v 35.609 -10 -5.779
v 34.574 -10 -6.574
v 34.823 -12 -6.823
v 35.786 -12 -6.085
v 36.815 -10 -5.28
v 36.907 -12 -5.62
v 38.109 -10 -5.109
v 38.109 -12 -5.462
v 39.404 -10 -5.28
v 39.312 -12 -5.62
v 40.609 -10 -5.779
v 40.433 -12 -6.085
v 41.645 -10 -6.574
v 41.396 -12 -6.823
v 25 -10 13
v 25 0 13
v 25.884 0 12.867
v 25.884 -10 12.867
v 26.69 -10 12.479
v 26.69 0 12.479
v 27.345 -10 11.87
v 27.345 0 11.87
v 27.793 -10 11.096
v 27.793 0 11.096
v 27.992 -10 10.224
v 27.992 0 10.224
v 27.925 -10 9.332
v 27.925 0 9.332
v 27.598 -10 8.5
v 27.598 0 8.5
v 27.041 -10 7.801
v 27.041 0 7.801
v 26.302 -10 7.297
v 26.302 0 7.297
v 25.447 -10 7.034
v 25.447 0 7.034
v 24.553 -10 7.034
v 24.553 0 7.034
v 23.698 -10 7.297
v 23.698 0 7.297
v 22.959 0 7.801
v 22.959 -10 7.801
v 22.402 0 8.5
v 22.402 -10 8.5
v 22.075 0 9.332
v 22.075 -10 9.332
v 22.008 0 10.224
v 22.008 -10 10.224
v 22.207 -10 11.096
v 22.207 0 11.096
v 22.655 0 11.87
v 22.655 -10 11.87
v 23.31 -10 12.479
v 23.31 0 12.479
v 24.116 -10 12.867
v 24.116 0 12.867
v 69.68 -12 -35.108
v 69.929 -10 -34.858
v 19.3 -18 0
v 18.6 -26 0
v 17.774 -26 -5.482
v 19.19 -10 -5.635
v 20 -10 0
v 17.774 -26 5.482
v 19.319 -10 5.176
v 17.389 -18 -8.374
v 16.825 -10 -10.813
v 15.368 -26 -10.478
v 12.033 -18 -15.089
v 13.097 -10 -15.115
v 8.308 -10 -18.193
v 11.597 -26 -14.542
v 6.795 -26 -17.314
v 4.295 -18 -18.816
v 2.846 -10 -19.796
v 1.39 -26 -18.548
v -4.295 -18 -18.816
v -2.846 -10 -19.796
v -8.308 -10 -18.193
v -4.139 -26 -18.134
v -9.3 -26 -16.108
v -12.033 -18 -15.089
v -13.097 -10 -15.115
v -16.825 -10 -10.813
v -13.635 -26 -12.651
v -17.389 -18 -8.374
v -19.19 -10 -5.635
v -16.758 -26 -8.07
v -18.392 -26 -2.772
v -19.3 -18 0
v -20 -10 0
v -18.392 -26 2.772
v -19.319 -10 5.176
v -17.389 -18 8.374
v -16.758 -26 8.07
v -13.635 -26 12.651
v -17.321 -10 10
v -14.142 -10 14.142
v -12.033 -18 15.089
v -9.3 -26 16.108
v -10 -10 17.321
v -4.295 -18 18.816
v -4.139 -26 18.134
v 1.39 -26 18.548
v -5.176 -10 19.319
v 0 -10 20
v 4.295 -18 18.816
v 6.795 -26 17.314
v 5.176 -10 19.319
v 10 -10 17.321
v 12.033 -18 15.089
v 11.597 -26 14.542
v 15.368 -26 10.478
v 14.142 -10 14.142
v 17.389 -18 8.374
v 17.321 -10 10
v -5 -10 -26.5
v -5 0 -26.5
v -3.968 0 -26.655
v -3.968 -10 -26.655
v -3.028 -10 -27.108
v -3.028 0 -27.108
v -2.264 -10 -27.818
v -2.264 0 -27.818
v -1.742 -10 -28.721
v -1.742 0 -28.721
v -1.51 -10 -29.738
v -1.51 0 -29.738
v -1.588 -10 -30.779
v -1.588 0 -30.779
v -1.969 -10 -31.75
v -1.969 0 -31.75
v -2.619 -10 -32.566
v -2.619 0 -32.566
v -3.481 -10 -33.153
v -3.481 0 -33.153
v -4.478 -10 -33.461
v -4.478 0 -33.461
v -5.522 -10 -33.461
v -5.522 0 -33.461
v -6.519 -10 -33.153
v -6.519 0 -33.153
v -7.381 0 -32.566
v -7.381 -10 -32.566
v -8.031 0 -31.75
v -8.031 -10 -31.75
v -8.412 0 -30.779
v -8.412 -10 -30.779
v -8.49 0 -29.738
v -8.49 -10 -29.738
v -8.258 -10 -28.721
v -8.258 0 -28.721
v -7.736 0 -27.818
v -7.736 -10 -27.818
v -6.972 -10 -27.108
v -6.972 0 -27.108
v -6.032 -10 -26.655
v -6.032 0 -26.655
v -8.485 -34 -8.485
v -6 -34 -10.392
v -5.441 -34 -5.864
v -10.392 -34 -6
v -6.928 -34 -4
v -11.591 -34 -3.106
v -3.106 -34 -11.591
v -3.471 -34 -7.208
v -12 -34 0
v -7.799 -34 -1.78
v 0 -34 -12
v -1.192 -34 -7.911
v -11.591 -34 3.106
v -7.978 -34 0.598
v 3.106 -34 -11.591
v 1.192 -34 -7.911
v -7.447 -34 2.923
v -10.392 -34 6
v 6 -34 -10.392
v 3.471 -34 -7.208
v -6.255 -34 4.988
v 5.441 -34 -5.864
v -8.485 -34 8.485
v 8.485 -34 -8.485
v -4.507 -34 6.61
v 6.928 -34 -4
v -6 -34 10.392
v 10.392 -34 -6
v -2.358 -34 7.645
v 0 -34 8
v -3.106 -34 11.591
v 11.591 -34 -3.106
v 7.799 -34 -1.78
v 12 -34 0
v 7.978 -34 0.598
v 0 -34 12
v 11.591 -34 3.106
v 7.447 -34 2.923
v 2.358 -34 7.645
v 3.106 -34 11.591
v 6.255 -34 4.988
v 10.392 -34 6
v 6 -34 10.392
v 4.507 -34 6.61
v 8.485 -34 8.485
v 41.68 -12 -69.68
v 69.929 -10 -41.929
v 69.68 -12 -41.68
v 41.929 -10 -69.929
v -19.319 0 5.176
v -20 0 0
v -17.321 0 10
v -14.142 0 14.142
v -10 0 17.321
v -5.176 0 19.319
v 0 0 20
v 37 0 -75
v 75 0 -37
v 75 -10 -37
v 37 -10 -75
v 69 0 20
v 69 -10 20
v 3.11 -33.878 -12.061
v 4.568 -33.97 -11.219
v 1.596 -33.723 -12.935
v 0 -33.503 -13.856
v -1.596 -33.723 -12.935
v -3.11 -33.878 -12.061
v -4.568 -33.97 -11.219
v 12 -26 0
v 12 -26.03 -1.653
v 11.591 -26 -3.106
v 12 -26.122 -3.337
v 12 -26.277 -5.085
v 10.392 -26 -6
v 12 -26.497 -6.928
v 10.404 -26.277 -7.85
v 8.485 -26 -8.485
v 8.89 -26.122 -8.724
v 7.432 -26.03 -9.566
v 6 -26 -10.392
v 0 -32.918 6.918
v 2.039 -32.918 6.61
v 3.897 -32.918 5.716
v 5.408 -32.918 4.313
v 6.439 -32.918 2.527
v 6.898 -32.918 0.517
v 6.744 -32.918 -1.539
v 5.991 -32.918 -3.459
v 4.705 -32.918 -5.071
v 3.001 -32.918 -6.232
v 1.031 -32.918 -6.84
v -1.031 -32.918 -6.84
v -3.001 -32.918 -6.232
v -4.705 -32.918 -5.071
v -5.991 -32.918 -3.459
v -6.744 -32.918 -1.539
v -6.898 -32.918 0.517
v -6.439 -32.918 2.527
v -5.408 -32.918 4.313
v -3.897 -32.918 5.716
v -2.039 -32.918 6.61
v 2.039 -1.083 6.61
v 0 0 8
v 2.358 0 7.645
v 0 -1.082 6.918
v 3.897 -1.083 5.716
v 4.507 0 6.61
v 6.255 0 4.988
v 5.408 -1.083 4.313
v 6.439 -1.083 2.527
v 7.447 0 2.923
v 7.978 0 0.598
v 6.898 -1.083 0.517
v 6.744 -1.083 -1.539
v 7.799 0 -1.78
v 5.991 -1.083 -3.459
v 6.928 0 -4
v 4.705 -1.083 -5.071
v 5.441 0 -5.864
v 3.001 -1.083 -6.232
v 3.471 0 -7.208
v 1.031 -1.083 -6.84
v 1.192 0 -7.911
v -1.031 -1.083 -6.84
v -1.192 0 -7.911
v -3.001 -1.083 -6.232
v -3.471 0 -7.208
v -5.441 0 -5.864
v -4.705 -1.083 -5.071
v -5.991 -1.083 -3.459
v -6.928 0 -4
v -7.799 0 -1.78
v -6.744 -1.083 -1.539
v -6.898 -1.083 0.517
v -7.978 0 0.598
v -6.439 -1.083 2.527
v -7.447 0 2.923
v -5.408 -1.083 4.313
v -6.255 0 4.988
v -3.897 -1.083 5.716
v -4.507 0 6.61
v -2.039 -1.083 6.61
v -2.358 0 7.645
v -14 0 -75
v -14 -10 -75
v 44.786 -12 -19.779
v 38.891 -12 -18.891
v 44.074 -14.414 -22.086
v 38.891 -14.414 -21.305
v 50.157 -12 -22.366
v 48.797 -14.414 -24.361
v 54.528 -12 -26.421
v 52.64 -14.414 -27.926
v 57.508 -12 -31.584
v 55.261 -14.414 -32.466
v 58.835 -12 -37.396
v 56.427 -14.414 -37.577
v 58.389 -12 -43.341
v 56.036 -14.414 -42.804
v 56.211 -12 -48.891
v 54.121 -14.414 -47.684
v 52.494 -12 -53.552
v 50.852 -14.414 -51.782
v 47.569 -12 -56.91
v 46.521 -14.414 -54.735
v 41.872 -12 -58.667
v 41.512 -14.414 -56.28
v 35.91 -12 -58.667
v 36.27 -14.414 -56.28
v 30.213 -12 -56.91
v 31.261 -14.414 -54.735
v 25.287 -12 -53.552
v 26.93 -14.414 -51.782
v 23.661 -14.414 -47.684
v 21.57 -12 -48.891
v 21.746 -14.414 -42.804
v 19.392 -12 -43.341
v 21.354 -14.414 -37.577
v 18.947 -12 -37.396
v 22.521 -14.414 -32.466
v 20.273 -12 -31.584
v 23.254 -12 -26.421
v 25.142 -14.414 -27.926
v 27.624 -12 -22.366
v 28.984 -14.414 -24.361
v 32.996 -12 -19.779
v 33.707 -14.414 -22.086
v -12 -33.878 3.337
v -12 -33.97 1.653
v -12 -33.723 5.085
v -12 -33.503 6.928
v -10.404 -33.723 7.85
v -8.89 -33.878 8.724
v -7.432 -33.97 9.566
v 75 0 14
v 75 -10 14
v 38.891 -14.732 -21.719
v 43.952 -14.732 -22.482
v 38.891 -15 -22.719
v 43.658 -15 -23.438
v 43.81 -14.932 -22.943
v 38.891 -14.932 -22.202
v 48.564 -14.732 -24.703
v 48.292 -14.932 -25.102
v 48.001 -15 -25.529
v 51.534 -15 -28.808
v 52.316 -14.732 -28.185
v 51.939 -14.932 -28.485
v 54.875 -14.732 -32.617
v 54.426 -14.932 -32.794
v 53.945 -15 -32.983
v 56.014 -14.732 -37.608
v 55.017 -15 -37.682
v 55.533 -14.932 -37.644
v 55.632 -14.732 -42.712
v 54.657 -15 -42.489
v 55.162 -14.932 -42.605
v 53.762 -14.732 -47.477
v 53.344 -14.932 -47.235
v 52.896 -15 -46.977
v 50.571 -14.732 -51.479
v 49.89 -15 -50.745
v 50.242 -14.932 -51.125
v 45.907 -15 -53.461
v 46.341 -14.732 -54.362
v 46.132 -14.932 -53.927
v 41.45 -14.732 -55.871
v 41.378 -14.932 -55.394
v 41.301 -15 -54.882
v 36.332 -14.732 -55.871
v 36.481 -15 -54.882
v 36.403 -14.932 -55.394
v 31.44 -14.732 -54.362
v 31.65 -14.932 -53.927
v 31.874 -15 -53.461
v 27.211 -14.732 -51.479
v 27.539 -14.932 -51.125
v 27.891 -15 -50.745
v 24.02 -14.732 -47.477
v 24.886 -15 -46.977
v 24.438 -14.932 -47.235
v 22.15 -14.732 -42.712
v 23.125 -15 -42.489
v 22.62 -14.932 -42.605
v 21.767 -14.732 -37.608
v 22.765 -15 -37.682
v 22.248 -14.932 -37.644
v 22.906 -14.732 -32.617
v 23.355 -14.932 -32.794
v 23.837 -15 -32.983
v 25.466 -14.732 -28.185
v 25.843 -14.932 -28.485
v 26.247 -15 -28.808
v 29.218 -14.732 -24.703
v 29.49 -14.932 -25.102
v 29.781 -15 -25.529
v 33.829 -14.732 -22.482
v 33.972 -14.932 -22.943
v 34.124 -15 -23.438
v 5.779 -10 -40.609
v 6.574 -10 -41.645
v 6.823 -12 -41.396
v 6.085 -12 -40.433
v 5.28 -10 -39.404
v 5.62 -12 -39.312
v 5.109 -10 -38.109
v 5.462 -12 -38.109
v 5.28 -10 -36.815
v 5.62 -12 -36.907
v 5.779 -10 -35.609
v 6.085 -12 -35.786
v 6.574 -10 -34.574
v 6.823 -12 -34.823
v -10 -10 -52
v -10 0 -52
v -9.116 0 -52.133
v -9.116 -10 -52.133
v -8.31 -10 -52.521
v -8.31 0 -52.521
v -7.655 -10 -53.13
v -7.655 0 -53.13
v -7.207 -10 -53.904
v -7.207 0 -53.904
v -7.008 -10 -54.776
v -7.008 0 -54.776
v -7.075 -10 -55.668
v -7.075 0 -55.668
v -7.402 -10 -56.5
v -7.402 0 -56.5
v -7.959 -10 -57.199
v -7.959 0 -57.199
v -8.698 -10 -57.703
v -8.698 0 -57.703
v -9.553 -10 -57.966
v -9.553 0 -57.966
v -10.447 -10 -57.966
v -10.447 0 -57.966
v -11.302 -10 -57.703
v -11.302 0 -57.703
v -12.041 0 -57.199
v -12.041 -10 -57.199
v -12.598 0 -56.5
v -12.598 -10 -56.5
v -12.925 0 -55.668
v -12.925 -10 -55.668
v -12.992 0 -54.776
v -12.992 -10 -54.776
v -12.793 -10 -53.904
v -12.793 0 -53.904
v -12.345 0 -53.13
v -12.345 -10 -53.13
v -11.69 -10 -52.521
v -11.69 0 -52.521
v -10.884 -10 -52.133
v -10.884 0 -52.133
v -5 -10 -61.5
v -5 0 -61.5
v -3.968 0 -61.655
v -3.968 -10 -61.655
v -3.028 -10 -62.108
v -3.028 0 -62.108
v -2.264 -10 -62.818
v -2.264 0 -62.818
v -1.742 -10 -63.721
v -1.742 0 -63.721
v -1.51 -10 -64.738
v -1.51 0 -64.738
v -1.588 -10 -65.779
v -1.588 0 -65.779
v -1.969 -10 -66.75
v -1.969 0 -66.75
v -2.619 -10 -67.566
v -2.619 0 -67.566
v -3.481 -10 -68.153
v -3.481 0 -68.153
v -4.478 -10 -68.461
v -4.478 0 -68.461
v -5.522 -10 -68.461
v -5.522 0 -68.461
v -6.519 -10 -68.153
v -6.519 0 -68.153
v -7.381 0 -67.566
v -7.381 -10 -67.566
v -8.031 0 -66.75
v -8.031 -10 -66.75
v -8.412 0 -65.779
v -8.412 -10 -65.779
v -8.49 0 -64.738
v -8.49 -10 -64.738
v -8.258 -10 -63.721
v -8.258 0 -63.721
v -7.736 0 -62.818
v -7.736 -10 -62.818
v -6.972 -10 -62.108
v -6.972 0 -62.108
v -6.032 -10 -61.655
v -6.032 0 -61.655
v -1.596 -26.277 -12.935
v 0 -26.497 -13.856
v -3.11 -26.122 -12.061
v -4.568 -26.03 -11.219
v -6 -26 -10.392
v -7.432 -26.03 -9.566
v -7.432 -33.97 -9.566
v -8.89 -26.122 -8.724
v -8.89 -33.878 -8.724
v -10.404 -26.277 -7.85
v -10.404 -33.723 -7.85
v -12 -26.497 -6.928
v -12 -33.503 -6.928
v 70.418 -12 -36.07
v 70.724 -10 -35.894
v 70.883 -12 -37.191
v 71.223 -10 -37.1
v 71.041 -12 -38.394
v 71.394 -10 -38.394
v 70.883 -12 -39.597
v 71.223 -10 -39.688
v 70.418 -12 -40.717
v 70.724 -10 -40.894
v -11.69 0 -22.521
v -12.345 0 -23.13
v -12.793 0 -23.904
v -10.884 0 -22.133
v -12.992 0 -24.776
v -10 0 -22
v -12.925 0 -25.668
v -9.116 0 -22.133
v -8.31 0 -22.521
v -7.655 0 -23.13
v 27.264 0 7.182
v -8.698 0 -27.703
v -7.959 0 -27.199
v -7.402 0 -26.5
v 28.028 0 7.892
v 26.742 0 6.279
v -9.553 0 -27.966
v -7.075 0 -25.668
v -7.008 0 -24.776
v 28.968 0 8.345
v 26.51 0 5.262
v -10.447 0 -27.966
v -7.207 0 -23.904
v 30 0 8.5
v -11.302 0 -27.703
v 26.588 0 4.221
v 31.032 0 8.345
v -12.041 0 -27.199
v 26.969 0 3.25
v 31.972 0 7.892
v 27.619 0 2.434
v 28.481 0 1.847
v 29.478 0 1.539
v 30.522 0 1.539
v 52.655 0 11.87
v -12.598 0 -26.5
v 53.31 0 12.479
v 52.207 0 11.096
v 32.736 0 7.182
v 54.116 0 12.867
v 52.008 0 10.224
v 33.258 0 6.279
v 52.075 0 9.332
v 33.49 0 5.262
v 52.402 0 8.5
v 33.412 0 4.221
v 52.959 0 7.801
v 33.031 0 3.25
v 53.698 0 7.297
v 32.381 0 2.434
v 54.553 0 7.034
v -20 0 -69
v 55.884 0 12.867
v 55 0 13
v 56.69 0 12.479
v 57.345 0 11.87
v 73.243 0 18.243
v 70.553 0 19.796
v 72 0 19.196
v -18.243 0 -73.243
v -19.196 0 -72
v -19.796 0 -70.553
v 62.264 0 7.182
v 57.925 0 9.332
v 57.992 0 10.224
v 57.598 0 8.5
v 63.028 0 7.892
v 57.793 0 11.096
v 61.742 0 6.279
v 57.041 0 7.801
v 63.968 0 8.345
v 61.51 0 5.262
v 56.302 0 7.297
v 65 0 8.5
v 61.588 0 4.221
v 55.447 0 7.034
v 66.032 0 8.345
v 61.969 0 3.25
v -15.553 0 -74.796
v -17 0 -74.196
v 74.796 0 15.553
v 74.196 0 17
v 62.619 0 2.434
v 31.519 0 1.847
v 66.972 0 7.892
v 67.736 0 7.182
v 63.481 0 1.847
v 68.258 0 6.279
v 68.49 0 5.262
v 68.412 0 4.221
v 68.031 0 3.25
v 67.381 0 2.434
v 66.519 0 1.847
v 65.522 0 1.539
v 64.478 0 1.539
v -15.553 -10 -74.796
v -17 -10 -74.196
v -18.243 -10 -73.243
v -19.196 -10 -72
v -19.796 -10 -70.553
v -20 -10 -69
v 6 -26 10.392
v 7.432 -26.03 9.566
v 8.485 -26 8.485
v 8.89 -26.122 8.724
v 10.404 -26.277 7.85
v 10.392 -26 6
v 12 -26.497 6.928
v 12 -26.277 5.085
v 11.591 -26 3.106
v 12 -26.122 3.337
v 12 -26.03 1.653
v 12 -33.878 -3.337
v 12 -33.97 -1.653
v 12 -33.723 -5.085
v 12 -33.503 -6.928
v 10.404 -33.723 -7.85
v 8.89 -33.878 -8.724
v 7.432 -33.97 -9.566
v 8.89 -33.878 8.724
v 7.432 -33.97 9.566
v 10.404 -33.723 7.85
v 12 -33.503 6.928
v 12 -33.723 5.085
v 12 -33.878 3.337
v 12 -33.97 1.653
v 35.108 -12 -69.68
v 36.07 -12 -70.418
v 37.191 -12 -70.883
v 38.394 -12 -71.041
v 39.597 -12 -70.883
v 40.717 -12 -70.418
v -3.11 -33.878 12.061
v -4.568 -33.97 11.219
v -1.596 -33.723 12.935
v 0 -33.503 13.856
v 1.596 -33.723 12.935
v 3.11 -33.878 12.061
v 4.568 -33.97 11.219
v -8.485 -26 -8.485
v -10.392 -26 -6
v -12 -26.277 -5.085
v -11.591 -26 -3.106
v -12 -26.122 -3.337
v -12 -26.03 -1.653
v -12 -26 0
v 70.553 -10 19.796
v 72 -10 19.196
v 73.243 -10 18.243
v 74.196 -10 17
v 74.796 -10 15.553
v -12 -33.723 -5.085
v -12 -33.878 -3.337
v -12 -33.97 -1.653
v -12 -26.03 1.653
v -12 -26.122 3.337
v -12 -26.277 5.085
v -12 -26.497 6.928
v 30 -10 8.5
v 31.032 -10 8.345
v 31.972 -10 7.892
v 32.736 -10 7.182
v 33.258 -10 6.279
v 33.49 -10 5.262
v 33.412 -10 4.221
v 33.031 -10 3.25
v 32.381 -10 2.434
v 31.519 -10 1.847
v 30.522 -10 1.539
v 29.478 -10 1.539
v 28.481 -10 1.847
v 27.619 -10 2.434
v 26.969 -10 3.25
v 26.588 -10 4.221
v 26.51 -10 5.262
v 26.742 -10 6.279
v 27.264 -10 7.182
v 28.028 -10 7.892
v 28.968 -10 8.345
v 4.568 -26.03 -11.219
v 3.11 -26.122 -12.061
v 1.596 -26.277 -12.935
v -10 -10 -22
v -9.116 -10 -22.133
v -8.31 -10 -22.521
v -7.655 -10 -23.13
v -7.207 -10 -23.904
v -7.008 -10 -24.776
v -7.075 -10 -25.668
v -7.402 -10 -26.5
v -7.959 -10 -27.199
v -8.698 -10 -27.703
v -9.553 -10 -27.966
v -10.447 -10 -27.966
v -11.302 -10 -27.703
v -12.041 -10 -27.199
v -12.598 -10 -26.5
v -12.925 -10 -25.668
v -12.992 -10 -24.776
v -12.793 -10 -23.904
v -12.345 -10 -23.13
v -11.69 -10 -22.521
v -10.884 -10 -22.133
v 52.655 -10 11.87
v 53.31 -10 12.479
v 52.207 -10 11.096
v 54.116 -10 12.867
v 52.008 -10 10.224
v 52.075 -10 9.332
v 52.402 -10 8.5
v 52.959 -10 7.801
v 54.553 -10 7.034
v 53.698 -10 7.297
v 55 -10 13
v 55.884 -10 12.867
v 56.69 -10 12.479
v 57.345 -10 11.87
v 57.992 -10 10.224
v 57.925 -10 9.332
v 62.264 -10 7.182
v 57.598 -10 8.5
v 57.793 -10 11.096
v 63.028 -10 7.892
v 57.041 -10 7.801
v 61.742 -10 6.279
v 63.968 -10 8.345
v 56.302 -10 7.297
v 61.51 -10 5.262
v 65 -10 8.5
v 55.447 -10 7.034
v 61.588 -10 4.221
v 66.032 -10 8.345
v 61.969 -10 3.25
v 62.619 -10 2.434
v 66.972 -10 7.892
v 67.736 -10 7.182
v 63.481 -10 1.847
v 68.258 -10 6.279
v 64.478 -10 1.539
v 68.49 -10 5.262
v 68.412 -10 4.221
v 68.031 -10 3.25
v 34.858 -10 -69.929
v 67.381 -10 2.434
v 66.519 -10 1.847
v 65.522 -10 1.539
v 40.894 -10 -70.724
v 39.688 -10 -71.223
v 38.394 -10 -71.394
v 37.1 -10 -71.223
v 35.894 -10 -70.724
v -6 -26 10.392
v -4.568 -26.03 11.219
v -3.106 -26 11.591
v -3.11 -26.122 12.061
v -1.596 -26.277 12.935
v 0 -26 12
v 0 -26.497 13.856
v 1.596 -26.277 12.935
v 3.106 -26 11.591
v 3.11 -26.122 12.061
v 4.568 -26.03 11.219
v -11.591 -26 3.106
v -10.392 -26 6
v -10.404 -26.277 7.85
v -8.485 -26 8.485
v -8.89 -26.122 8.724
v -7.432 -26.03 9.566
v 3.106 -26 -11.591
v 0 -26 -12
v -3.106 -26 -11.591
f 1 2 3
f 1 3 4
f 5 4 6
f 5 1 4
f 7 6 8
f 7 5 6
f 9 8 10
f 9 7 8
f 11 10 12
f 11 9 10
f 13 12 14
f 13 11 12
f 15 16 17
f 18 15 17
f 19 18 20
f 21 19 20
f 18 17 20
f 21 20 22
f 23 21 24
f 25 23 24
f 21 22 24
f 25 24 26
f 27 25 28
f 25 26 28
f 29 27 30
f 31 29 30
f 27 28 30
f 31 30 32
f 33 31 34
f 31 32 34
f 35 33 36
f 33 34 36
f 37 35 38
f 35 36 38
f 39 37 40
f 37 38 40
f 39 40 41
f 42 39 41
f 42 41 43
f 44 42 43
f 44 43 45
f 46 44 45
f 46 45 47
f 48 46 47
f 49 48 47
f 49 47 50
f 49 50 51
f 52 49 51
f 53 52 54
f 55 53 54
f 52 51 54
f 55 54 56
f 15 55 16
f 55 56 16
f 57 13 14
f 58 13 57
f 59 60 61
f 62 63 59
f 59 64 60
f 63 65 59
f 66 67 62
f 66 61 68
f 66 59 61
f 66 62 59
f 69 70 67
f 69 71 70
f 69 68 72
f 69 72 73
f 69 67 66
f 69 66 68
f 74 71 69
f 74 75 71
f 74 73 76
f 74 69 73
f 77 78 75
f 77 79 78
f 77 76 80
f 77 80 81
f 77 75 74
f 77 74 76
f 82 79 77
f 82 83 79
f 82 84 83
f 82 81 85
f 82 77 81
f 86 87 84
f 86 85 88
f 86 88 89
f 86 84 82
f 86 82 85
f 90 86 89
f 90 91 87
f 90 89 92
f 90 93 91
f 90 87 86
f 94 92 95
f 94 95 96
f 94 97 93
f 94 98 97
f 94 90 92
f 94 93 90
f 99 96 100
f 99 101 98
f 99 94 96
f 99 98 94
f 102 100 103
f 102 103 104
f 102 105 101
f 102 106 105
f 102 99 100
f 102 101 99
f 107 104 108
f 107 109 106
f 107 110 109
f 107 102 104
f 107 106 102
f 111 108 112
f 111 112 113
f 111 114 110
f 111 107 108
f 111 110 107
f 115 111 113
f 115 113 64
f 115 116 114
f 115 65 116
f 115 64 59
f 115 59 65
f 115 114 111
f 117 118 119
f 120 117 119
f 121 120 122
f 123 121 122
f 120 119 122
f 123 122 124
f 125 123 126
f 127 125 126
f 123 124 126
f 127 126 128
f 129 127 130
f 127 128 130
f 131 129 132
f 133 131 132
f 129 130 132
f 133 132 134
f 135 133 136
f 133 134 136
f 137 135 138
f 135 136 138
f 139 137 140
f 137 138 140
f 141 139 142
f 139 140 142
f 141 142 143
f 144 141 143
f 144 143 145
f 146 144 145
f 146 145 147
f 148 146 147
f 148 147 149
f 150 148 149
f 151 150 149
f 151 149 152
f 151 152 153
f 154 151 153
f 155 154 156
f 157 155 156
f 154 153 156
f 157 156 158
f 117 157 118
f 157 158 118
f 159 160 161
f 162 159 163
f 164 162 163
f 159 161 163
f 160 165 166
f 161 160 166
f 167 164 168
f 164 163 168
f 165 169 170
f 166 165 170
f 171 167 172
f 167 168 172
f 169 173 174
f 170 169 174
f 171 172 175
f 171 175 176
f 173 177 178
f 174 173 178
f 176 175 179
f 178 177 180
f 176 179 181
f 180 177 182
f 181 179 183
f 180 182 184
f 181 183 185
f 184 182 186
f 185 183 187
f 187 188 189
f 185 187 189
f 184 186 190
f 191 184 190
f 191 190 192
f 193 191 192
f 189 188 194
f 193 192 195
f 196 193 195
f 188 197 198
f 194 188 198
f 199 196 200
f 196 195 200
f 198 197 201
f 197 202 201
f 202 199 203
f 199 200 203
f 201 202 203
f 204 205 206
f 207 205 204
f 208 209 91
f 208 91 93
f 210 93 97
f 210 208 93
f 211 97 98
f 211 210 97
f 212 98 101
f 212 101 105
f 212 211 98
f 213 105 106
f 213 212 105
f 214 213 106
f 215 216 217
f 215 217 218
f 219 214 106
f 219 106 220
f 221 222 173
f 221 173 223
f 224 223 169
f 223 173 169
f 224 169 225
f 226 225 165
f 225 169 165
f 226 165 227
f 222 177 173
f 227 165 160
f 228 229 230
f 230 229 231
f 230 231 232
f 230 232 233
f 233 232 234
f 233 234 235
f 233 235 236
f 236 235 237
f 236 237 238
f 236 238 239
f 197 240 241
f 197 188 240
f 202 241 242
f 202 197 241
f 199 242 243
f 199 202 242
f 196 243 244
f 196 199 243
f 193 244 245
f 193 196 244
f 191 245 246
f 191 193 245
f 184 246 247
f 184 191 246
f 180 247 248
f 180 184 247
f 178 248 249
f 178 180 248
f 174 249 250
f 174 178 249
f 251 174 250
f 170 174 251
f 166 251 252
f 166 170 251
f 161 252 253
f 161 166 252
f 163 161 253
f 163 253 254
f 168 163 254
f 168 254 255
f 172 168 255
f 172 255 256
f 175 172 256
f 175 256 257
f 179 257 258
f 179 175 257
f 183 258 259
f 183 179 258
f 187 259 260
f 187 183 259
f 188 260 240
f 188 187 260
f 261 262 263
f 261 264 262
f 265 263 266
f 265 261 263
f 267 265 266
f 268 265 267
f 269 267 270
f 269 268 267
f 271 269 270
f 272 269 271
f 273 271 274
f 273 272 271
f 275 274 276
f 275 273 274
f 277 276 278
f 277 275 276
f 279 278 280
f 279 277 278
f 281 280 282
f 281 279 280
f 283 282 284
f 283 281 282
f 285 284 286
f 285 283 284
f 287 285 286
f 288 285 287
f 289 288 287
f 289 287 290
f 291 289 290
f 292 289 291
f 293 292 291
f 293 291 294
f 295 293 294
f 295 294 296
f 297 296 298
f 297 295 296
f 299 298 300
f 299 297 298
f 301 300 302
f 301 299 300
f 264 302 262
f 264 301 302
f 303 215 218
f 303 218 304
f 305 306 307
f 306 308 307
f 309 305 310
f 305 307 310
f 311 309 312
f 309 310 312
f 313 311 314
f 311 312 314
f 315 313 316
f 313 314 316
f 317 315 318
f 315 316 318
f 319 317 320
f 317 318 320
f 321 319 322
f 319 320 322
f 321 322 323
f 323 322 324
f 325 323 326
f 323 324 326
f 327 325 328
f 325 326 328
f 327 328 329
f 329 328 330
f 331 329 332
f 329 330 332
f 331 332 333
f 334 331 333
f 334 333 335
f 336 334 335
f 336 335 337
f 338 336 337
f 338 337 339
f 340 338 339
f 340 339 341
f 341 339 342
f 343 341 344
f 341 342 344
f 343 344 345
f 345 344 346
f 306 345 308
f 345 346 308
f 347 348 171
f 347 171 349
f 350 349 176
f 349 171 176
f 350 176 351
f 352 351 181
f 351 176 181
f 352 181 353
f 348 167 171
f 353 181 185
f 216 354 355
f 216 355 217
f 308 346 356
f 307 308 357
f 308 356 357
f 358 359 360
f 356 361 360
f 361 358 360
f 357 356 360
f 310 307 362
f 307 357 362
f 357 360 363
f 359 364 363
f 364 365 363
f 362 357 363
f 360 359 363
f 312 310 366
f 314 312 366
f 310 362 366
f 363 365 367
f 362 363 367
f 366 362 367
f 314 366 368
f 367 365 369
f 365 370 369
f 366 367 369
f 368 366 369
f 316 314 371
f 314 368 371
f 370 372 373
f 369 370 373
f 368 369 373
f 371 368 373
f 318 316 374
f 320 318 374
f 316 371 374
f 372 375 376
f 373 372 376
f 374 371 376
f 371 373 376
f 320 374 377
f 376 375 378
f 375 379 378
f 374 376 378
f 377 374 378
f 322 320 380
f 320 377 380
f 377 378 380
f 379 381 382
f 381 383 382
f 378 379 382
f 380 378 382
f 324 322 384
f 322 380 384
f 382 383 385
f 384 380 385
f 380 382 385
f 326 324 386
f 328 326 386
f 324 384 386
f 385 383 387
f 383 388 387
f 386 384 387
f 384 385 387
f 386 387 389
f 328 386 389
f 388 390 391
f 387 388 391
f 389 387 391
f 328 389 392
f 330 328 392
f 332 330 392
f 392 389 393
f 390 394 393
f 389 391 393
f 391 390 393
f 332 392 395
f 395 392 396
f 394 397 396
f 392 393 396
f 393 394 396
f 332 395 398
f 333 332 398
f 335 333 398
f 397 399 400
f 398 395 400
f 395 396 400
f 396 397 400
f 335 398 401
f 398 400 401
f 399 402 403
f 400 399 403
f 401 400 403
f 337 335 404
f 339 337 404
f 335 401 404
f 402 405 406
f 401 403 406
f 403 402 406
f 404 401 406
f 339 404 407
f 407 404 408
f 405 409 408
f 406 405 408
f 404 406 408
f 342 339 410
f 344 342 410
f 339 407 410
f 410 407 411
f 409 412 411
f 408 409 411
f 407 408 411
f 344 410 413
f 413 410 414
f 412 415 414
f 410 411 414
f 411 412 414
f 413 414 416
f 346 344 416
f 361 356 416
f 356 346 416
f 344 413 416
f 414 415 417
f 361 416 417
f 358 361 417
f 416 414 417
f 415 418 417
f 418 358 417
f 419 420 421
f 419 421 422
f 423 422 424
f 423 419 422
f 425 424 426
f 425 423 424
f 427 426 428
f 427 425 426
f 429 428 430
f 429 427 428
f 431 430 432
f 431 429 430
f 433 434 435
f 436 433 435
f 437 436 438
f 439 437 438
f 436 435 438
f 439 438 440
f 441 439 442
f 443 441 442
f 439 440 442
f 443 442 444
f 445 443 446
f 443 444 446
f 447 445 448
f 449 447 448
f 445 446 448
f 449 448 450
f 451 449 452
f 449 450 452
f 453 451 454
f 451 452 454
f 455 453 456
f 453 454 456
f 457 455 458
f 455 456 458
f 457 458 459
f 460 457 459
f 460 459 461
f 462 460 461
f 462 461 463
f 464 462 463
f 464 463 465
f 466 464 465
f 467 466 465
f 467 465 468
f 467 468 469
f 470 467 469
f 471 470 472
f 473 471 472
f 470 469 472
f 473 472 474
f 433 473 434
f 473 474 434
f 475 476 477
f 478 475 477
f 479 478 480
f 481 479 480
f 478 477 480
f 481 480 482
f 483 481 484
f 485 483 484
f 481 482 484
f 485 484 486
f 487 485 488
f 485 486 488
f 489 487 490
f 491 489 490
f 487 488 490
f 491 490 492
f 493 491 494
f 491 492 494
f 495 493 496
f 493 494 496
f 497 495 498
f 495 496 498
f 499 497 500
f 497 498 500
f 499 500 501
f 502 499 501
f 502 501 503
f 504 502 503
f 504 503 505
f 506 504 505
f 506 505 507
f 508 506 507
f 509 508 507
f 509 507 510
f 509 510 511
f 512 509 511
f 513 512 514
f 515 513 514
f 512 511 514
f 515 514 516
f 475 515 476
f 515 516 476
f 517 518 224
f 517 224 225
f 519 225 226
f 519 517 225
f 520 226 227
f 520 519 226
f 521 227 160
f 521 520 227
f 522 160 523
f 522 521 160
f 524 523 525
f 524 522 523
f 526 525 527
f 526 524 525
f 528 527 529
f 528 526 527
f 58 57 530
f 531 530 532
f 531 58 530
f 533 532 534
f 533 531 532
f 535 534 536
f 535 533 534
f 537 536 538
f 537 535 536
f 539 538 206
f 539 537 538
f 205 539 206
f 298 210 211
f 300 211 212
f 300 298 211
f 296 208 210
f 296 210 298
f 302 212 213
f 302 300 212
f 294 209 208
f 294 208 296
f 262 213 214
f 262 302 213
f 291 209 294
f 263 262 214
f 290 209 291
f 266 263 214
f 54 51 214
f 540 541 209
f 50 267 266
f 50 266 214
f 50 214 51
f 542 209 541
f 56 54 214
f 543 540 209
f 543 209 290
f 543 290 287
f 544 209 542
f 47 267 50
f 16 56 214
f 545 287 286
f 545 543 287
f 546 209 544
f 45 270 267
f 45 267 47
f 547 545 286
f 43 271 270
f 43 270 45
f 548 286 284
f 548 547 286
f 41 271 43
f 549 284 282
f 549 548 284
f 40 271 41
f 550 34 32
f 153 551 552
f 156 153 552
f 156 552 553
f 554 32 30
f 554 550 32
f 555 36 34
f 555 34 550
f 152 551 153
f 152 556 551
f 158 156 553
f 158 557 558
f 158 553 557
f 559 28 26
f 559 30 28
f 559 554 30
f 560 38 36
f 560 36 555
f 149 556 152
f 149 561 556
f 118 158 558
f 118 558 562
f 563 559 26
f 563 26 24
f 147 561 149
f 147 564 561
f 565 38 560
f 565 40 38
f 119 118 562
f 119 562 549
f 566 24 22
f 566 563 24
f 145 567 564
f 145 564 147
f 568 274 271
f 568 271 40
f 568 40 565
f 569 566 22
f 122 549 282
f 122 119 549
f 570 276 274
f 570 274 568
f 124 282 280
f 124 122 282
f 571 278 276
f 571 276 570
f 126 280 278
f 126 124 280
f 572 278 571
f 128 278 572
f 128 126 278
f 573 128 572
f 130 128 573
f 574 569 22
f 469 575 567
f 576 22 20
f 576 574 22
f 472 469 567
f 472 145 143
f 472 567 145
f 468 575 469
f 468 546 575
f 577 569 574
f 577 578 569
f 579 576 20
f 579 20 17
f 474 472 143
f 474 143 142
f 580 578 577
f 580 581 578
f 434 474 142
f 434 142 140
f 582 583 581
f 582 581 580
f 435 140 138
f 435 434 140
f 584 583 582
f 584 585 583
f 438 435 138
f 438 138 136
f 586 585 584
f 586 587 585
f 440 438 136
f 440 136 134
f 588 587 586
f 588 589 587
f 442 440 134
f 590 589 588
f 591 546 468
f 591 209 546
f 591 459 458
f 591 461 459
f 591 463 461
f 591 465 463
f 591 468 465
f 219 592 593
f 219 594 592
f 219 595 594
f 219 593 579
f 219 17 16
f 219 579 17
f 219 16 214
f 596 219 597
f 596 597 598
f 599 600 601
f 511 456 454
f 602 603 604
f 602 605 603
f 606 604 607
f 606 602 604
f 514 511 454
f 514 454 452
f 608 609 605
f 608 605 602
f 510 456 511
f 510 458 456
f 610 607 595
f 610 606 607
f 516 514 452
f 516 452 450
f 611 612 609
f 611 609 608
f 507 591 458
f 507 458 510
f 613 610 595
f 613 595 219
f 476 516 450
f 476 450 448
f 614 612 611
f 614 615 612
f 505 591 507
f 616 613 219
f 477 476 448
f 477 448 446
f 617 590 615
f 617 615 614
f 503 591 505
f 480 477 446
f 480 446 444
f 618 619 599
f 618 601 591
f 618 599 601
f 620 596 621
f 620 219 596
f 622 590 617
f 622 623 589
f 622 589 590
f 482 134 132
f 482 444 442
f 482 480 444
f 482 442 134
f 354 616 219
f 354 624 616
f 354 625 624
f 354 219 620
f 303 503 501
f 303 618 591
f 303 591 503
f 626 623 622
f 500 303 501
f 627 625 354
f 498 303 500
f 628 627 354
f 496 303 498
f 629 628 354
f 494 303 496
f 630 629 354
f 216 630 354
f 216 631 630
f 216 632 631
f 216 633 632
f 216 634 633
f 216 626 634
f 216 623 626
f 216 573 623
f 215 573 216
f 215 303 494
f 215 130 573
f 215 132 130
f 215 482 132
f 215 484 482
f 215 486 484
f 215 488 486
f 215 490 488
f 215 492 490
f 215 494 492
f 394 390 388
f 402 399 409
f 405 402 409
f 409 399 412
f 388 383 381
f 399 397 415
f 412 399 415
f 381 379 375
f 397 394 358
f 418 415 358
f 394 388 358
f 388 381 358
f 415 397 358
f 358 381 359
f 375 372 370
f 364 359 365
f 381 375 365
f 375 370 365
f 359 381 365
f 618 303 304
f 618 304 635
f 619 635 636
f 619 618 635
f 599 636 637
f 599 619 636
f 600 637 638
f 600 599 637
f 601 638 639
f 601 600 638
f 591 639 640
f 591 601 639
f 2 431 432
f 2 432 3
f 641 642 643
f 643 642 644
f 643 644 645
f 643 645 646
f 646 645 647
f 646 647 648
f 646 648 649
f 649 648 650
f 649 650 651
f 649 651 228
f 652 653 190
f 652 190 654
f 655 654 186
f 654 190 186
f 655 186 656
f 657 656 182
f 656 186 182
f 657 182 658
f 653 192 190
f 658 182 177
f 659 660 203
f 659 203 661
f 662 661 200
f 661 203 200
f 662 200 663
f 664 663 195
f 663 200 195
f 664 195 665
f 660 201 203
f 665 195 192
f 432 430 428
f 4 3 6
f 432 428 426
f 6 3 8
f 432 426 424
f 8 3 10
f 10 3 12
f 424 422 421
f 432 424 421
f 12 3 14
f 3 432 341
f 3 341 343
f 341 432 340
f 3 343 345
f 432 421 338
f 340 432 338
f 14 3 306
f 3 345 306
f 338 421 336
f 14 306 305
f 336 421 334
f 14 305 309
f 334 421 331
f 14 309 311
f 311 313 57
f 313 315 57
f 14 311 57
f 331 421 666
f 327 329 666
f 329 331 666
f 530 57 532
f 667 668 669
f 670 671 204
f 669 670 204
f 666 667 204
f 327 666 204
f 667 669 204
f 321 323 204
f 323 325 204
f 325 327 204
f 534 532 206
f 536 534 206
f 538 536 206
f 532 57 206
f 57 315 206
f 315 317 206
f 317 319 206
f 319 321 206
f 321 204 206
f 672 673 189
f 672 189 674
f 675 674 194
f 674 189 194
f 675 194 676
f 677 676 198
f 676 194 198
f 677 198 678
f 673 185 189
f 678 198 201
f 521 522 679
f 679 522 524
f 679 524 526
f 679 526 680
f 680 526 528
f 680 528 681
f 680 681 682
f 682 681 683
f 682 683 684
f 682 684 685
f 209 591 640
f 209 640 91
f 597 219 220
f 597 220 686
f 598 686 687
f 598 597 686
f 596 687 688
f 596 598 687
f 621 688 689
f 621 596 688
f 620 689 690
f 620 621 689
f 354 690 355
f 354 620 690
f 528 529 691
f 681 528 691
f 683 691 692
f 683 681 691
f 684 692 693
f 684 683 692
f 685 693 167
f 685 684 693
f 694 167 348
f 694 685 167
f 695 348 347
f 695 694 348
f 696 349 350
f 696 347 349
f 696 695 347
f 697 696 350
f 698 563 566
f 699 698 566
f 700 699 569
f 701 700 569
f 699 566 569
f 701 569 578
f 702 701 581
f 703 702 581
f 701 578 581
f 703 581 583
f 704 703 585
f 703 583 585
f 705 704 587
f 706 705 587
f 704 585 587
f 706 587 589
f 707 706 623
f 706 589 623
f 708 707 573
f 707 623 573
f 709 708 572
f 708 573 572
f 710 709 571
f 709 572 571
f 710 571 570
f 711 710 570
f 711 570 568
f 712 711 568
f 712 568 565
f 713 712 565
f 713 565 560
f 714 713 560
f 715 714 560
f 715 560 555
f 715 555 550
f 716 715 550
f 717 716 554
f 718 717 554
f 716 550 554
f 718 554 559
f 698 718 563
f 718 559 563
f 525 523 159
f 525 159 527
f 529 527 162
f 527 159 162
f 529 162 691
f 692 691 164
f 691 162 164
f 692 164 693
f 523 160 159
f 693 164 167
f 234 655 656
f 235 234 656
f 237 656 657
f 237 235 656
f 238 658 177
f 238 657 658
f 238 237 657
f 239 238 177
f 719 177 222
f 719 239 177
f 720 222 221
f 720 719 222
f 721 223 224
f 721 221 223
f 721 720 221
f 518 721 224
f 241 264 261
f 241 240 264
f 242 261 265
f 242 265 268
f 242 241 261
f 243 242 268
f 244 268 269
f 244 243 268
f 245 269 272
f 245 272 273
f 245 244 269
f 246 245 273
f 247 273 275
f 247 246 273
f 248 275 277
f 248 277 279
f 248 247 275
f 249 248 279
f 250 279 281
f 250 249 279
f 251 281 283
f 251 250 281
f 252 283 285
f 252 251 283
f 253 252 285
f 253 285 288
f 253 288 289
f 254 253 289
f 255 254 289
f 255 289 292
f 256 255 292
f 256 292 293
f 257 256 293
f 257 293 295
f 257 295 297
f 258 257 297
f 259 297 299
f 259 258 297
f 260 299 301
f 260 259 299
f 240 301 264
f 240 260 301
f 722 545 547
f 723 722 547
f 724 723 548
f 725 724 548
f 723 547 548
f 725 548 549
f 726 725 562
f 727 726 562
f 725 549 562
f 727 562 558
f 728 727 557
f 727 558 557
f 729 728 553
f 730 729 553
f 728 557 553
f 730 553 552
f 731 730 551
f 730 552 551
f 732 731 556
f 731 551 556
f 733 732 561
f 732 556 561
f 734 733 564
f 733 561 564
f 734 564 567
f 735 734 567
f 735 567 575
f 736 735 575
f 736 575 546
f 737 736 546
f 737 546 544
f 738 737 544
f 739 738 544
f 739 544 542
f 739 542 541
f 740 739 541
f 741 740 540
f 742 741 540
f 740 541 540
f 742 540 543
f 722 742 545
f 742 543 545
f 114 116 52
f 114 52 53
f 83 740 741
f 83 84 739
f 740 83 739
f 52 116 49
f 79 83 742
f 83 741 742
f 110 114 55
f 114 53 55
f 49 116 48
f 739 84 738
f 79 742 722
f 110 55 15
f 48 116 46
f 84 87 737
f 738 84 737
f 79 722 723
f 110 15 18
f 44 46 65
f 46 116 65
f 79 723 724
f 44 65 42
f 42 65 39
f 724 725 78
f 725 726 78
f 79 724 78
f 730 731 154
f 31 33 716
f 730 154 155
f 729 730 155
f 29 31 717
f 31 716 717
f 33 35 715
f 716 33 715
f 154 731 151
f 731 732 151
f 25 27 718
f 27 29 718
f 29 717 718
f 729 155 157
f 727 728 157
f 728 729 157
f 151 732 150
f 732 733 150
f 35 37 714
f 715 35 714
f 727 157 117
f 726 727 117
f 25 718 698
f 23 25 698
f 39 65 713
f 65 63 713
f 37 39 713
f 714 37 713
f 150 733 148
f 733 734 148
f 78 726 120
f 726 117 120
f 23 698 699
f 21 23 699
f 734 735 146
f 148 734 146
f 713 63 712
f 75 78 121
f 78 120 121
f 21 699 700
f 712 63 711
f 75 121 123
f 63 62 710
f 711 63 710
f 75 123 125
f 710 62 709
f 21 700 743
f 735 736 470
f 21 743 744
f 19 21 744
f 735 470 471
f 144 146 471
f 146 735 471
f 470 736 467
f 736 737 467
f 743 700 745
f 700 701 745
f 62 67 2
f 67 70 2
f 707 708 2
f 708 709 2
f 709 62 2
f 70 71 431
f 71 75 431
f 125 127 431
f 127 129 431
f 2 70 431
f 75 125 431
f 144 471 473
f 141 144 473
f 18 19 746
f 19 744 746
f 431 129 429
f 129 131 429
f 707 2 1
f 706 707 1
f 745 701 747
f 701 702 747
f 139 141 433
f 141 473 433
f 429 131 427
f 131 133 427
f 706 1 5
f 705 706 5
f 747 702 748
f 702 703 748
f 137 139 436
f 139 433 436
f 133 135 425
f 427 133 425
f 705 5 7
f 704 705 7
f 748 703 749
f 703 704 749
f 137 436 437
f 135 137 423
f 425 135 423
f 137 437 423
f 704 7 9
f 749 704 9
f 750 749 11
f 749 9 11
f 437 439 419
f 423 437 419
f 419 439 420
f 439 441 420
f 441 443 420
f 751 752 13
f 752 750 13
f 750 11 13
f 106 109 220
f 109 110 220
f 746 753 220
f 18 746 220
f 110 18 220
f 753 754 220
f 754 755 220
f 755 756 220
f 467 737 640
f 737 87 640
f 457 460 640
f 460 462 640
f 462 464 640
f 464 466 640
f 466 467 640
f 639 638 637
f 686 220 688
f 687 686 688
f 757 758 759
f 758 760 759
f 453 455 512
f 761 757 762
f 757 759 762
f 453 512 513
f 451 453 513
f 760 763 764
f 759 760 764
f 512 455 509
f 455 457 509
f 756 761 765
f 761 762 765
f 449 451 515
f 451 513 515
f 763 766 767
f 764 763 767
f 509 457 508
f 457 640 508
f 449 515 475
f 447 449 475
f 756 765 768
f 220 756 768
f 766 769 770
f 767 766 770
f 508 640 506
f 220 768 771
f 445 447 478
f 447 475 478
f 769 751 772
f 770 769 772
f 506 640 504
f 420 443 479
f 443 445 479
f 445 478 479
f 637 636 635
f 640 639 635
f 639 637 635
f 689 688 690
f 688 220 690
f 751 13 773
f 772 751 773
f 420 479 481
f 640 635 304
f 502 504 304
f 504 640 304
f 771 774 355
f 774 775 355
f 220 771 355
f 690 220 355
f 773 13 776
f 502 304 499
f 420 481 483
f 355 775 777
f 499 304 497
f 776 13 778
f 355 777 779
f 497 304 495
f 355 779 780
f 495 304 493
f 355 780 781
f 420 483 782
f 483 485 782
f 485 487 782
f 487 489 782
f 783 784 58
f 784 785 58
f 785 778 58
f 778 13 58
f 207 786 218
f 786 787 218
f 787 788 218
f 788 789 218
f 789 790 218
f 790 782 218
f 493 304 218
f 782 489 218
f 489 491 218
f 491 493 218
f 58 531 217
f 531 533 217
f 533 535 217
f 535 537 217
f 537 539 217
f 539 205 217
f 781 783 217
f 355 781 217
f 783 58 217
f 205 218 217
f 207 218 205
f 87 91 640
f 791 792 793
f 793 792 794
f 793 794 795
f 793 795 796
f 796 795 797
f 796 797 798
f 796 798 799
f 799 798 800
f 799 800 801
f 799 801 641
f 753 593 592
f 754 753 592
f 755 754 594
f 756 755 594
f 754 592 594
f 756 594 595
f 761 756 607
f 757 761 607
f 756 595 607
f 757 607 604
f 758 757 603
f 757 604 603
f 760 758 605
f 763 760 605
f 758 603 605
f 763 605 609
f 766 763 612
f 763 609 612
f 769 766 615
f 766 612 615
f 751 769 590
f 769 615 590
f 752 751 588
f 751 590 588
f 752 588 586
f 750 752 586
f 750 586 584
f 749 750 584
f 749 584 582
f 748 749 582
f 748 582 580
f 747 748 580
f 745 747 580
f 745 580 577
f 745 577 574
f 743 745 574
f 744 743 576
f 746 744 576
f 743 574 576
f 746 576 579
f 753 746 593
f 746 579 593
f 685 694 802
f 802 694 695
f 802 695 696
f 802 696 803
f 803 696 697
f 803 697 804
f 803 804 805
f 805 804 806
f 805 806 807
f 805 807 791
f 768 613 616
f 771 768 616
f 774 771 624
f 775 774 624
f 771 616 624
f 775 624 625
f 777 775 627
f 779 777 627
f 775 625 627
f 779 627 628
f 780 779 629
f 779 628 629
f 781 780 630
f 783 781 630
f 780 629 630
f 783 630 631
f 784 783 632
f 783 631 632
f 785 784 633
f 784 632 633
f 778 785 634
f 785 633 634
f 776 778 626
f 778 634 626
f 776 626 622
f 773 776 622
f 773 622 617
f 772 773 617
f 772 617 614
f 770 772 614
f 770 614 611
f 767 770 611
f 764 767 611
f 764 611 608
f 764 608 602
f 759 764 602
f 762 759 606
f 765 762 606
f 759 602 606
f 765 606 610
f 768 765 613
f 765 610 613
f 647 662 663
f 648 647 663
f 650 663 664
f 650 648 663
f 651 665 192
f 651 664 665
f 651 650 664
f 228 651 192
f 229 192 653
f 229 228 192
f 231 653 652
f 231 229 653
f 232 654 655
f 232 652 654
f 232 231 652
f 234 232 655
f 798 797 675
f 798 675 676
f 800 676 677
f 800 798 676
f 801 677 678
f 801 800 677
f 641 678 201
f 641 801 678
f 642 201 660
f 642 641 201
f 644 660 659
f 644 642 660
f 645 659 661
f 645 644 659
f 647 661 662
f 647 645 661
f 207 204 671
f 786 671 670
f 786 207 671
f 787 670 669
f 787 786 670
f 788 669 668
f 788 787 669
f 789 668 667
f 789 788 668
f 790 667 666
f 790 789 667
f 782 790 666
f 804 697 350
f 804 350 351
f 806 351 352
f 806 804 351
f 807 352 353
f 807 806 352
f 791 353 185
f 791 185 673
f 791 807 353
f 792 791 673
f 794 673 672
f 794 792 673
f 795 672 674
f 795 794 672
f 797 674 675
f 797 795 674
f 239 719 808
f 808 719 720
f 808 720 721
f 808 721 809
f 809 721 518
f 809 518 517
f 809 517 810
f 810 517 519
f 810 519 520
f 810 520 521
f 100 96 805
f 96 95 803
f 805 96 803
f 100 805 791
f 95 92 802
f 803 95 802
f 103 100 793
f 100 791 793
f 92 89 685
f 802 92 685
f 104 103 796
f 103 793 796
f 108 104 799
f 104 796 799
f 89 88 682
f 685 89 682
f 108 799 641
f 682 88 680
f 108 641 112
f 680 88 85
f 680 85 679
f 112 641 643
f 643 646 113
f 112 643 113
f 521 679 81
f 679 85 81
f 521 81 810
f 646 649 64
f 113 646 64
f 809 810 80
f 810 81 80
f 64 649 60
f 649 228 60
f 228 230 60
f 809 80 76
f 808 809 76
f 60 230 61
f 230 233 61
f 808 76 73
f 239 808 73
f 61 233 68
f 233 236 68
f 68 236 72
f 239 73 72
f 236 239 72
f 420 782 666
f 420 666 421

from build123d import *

# Parameters (mm, degrees)
SKETCH_1_R          = 3.5
SKETCH_1_R_2        = 3
EXTRUDE_1_DEPTH     = 10
SKETCH_2_R          = 20
EXTRUDE_2_DEPTH     = 16
EXTRUDE_2_DRAFT     = -5
SKETCH_4_W          = 48
SKETCH_4_H          = 48
CUT_EXTRUDE_1_DEPTH = 16
EXTRUDE_3_DEPTH     = 2
EXTRUDE_3_DRAFT     = -10


with BuildPart() as part:
    # 草图1 → 凸台-拉伸1 (new body)
    with BuildSketch(Plane(origin=(0, 0, 0), x_dir=(1, 0, 0), z_dir=(0, 1, 0))):
        with BuildLine():
            Line((0, -20), (69, -20))
            ThreePointArc((69, -20), (73.242640687, -18.242640687), (75, -14))
            Line((75, -14), (75, 37))
            Line((75, 37), (37, 75))
            Line((37, 75), (-14, 75))
            ThreePointArc((-14, 75), (-18.242640687, 73.242640687), (-20, 69))
            Line((-20, 69), (-20, 0))
            ThreePointArc((-20, 0), (-14.142135624, -14.142135624), (0, -20))
        make_face()
        with Locations((65, -5)):
            Circle(SKETCH_1_R, mode=Mode.SUBTRACT)
        with Locations((55, -10)):
            Circle(SKETCH_1_R_2, mode=Mode.SUBTRACT)
        with Locations((30, -5)):
            Circle(SKETCH_1_R, mode=Mode.SUBTRACT)
        with Locations((25, -10)):
            Circle(SKETCH_1_R_2, mode=Mode.SUBTRACT)
        with Locations((-5, 30)):
            Circle(SKETCH_1_R, mode=Mode.SUBTRACT)
        with Locations((-5, 65)):
            Circle(SKETCH_1_R, mode=Mode.SUBTRACT)
        with Locations((-10, 25)):
            Circle(SKETCH_1_R_2, mode=Mode.SUBTRACT)
        with Locations((-10, 55)):
            Circle(SKETCH_1_R_2, mode=Mode.SUBTRACT)
    extrude(amount=-EXTRUDE_1_DEPTH)


with BuildPart() as extrude_2_tool:
    # 草图2 → 凸台-拉伸2 (with draft: the straight prism first)
    with BuildSketch(Plane(origin=(0, -10, 0), x_dir=(1, 0, 0), z_dir=(0, 1, 0))):
        Circle(SKETCH_2_R)
    extrude(amount=-EXTRUDE_2_DEPTH)
    # 凸台-拉伸2: the draft: its side faces are tilted about the plane it starts from
    extrude_2_sides = [extrude_2_tool.faces().sort_by_distance(p)[0] for p in [
        (-20, -18, 0),
    ]]
    draft(extrude_2_sides, Plane(origin=(0, -10, 0), x_dir=(1, 0, 0), z_dir=(0, 1, 0)), EXTRUDE_2_DRAFT)


with BuildPart() as part_1:
    add(part.part)

    # 凸台-拉伸2: add extrude_2_tool
    add(extrude_2_tool.part)

    # 草图3 → 旋转1 (revolve)
    with BuildSketch(Plane.XY):
        Polygon((0, -26), (12, -26), (14.4, -26.643078062), (14.4, -33.356921938), (12, -34), (0, -34), align=None)
    revolve(axis=Axis((0, -34, 0), (0, 1, 0)))

    # 草图4 → 切除-拉伸1 (cut)
    with BuildSketch(Plane(origin=(0, -26, 0), x_dir=(1, 0, 0), z_dir=(0, 1, 0))):
        Rectangle(SKETCH_4_W, SKETCH_4_H)
        Polygon((-12, -6.92820323), (0, -13.856406461), (12, -6.92820323), (12, 6.92820323), (0, 13.856406461), (-12, 6.92820323), align=None, mode=Mode.SUBTRACT)
    extrude(amount=-CUT_EXTRUDE_1_DEPTH, mode=Mode.SUBTRACT)

    # 草图5 → 切除-旋转1 (revolve, cut)
    with BuildSketch(Plane.XY):
        Polygon((0, 0), (8, 0), (6.9175, -1.0825), (6.9175, -32.9175), (8, -34), (0, -34), align=None)
    revolve(axis=Axis((0, -34, 0), (0, 1, 0)), mode=Mode.SUBTRACT)


with BuildPart() as extrude_3_tool:
    # 草图6 → 凸台-拉伸3 (with draft: the straight prism first)
    with BuildSketch(Plane(origin=(0, -10, 0), x_dir=(1, 0, 0), z_dir=(0, 1, 0))):
        with BuildLine():
            Line((6.573950263, 34.573950263), (34.573950263, 6.573950263))
            ThreePointArc((34.573950263, 6.573950263), (38.109484168, 5.109484168), (41.645018074, 6.573950263))
            Line((41.645018074, 6.573950263), (69.929289322, 34.85822151))
            ThreePointArc((69.929289322, 34.85822151), (71.393755416, 38.393755416), (69.929289322, 41.929289322))
            Line((69.929289322, 41.929289322), (41.929289322, 69.929289322))
            ThreePointArc((41.929289322, 69.929289322), (38.393755416, 71.393755416), (34.85822151, 69.929289322))
            Line((34.85822151, 69.929289322), (6.573950263, 41.645018074))
            ThreePointArc((6.573950263, 41.645018074), (5.109484168, 38.109484168), (6.573950263, 34.573950263))
        make_face()
    extrude(amount=-EXTRUDE_3_DEPTH)
    # 凸台-拉伸3: the draft: its side faces are tilted about the plane it starts from
    extrude_3_sides = [extrude_3_tool.faces().sort_by_distance(p)[0] for p in [
        (20.573950263, -11, -20.573950263),
        (38.109484168, -11, -5.109484168),
        (55.787153698, -11, -20.716085886),
        (71.393755416, -11, -38.393755416),
        (55.929289322, -11, -55.929289322),
        (38.393755416, -11, -71.393755416),
        (20.716085886, -11, -55.787153698),
        (5.109484168, -11, -38.109484168),
    ]]
    draft(extrude_3_sides, Plane(origin=(0, -10, 0), x_dir=(1, 0, 0), z_dir=(0, 1, 0)), EXTRUDE_3_DRAFT)


with BuildPart() as part_2:
    add(part_1.part)

    # 凸台-拉伸3: add extrude_3_tool
    add(extrude_3_tool.part)

    # 草图7 → 旋转2 (revolve)
    with BuildSketch(Plane(origin=(0, 0, 0), x_dir=(0.7071067811865476, 0, -0.7071067811865475), z_dir=(0.7071067811865475, 0, 0.7071067811865476))):
        with BuildLine():
            Line((55, -12), (75, -12))
            Line((75, -12), (72.585786438, -14.414213562))
            ThreePointArc((72.585786438, -14.414213562), (71.93693974, -14.847759065), (71.171572875, -15))
            Line((71.171572875, -15), (55, -15))
            Line((55, -15), (55, -12))
        make_face()
    revolve(axis=Axis((38.890872965, -15, -38.890872965), (0, 1, 0)))


solid = part_2.part
